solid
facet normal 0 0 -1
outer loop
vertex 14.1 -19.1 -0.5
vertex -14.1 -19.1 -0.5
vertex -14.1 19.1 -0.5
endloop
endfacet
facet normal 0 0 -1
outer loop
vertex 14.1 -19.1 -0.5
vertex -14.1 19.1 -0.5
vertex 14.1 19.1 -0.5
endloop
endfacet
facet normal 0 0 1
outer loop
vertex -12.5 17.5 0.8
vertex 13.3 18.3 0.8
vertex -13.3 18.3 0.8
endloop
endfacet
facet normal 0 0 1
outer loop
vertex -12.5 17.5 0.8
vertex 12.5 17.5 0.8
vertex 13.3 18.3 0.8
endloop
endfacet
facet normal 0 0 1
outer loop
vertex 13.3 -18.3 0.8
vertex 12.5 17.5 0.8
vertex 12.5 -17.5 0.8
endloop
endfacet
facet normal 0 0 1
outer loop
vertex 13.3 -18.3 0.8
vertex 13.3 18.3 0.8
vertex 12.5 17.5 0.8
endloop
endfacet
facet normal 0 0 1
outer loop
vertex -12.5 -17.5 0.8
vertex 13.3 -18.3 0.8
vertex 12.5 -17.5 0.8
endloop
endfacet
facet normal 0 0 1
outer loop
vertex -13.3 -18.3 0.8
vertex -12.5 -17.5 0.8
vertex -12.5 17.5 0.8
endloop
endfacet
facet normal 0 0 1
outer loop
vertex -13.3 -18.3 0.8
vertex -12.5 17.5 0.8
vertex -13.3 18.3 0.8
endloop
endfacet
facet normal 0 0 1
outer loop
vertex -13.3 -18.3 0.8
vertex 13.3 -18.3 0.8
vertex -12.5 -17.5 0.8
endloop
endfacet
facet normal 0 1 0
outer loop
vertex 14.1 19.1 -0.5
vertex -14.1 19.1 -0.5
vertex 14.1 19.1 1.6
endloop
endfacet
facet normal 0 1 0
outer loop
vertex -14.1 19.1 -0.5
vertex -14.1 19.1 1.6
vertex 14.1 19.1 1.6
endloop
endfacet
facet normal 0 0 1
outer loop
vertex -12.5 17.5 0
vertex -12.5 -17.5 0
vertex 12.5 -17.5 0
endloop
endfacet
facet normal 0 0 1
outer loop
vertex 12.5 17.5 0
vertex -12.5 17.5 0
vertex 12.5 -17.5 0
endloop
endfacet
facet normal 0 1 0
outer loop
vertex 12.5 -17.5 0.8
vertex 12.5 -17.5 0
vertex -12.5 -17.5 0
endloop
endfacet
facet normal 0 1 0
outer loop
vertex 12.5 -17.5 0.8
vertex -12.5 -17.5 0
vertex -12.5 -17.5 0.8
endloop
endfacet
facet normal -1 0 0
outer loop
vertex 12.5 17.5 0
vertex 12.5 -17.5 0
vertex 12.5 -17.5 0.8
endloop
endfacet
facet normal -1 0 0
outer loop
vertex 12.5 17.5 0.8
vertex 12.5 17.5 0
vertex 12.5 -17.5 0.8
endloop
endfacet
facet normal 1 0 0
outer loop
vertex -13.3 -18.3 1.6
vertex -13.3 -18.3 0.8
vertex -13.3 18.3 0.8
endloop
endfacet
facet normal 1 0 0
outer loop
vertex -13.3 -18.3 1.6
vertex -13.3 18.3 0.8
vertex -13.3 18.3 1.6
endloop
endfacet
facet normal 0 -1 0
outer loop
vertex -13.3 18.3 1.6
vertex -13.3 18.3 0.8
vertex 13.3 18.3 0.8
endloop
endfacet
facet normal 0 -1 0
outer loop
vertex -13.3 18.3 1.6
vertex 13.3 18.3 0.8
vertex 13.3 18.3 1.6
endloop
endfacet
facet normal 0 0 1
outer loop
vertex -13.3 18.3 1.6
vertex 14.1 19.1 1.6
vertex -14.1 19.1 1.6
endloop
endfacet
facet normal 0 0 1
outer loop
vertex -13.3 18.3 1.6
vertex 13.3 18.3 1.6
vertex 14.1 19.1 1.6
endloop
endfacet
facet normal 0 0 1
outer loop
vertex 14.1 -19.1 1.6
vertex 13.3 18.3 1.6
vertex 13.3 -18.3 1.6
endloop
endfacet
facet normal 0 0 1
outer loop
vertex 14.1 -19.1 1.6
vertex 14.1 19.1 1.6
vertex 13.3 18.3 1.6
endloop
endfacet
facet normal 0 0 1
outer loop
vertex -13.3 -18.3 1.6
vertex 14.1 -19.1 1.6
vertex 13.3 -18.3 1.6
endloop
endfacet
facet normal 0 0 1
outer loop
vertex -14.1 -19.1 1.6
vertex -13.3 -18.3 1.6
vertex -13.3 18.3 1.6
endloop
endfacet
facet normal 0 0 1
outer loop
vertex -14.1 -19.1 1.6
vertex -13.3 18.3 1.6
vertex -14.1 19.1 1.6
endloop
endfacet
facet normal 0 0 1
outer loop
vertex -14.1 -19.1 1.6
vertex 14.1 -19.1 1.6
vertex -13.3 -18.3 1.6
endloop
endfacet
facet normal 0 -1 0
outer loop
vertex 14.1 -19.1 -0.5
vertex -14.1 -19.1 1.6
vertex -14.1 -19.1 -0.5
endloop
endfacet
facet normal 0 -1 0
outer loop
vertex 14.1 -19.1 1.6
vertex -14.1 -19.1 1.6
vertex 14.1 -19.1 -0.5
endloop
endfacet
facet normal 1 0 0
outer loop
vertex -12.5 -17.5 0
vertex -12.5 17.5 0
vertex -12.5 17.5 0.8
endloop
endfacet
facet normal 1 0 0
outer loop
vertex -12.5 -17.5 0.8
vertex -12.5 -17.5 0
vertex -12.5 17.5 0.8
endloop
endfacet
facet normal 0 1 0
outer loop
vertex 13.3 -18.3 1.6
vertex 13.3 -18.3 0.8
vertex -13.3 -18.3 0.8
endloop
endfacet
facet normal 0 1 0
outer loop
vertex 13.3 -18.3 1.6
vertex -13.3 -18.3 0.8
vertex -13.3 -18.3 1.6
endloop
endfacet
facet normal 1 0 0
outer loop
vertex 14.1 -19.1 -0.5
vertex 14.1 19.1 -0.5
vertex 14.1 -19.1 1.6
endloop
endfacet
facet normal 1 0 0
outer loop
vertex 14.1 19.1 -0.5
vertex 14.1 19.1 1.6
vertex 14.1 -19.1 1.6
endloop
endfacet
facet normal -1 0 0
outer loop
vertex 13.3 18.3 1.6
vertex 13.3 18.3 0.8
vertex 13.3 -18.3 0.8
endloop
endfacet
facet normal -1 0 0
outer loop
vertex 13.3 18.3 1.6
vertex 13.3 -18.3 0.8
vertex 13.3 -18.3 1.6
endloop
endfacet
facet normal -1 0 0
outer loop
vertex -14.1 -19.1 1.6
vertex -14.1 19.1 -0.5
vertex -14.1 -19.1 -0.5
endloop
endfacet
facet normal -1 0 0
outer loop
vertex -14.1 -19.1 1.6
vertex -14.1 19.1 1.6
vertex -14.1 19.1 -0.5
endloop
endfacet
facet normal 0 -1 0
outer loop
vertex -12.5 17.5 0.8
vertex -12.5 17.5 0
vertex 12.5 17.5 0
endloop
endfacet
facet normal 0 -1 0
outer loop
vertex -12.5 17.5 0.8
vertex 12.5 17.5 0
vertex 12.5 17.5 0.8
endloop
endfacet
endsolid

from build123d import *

# Parameters (mm, degrees)
F3_W     = 28.2
F3_H     = 38.2
F4_DEPTH = 0.5


with BuildPart() as f2:
    # F2: sweep along a path in F0
    with BuildLine(Plane.XY) as f2_path:
        Line((-12.5, 17.5), (-12.5, -17.5))
        Line((-12.5, -17.5), (12.5, -17.5))
        Line((12.5, -17.5), (12.5, 17.5))
        Line((12.5, 17.5), (-12.5, 17.5))
    # F1 (on Front) → F2 (sweep)
    with BuildSketch(Plane.XZ):
        Polygon((-14.1, 0), (-12.5, 0), (-12.5, 0.8), (-13.3, 0.8), (-13.3, 1.6), (-14.1, 1.6), align=None)
    sweep(path=f2_path.line, transition=Transition.RIGHT)

    # F3 (on face) → F4 (join)
    with BuildSketch(Plane(origin=(0, 0, 0), x_dir=(1, 0, 0), z_dir=(0, 0, -1))):
        Rectangle(F3_W, F3_H)
    extrude(amount=F4_DEPTH)


solid = f2.part
